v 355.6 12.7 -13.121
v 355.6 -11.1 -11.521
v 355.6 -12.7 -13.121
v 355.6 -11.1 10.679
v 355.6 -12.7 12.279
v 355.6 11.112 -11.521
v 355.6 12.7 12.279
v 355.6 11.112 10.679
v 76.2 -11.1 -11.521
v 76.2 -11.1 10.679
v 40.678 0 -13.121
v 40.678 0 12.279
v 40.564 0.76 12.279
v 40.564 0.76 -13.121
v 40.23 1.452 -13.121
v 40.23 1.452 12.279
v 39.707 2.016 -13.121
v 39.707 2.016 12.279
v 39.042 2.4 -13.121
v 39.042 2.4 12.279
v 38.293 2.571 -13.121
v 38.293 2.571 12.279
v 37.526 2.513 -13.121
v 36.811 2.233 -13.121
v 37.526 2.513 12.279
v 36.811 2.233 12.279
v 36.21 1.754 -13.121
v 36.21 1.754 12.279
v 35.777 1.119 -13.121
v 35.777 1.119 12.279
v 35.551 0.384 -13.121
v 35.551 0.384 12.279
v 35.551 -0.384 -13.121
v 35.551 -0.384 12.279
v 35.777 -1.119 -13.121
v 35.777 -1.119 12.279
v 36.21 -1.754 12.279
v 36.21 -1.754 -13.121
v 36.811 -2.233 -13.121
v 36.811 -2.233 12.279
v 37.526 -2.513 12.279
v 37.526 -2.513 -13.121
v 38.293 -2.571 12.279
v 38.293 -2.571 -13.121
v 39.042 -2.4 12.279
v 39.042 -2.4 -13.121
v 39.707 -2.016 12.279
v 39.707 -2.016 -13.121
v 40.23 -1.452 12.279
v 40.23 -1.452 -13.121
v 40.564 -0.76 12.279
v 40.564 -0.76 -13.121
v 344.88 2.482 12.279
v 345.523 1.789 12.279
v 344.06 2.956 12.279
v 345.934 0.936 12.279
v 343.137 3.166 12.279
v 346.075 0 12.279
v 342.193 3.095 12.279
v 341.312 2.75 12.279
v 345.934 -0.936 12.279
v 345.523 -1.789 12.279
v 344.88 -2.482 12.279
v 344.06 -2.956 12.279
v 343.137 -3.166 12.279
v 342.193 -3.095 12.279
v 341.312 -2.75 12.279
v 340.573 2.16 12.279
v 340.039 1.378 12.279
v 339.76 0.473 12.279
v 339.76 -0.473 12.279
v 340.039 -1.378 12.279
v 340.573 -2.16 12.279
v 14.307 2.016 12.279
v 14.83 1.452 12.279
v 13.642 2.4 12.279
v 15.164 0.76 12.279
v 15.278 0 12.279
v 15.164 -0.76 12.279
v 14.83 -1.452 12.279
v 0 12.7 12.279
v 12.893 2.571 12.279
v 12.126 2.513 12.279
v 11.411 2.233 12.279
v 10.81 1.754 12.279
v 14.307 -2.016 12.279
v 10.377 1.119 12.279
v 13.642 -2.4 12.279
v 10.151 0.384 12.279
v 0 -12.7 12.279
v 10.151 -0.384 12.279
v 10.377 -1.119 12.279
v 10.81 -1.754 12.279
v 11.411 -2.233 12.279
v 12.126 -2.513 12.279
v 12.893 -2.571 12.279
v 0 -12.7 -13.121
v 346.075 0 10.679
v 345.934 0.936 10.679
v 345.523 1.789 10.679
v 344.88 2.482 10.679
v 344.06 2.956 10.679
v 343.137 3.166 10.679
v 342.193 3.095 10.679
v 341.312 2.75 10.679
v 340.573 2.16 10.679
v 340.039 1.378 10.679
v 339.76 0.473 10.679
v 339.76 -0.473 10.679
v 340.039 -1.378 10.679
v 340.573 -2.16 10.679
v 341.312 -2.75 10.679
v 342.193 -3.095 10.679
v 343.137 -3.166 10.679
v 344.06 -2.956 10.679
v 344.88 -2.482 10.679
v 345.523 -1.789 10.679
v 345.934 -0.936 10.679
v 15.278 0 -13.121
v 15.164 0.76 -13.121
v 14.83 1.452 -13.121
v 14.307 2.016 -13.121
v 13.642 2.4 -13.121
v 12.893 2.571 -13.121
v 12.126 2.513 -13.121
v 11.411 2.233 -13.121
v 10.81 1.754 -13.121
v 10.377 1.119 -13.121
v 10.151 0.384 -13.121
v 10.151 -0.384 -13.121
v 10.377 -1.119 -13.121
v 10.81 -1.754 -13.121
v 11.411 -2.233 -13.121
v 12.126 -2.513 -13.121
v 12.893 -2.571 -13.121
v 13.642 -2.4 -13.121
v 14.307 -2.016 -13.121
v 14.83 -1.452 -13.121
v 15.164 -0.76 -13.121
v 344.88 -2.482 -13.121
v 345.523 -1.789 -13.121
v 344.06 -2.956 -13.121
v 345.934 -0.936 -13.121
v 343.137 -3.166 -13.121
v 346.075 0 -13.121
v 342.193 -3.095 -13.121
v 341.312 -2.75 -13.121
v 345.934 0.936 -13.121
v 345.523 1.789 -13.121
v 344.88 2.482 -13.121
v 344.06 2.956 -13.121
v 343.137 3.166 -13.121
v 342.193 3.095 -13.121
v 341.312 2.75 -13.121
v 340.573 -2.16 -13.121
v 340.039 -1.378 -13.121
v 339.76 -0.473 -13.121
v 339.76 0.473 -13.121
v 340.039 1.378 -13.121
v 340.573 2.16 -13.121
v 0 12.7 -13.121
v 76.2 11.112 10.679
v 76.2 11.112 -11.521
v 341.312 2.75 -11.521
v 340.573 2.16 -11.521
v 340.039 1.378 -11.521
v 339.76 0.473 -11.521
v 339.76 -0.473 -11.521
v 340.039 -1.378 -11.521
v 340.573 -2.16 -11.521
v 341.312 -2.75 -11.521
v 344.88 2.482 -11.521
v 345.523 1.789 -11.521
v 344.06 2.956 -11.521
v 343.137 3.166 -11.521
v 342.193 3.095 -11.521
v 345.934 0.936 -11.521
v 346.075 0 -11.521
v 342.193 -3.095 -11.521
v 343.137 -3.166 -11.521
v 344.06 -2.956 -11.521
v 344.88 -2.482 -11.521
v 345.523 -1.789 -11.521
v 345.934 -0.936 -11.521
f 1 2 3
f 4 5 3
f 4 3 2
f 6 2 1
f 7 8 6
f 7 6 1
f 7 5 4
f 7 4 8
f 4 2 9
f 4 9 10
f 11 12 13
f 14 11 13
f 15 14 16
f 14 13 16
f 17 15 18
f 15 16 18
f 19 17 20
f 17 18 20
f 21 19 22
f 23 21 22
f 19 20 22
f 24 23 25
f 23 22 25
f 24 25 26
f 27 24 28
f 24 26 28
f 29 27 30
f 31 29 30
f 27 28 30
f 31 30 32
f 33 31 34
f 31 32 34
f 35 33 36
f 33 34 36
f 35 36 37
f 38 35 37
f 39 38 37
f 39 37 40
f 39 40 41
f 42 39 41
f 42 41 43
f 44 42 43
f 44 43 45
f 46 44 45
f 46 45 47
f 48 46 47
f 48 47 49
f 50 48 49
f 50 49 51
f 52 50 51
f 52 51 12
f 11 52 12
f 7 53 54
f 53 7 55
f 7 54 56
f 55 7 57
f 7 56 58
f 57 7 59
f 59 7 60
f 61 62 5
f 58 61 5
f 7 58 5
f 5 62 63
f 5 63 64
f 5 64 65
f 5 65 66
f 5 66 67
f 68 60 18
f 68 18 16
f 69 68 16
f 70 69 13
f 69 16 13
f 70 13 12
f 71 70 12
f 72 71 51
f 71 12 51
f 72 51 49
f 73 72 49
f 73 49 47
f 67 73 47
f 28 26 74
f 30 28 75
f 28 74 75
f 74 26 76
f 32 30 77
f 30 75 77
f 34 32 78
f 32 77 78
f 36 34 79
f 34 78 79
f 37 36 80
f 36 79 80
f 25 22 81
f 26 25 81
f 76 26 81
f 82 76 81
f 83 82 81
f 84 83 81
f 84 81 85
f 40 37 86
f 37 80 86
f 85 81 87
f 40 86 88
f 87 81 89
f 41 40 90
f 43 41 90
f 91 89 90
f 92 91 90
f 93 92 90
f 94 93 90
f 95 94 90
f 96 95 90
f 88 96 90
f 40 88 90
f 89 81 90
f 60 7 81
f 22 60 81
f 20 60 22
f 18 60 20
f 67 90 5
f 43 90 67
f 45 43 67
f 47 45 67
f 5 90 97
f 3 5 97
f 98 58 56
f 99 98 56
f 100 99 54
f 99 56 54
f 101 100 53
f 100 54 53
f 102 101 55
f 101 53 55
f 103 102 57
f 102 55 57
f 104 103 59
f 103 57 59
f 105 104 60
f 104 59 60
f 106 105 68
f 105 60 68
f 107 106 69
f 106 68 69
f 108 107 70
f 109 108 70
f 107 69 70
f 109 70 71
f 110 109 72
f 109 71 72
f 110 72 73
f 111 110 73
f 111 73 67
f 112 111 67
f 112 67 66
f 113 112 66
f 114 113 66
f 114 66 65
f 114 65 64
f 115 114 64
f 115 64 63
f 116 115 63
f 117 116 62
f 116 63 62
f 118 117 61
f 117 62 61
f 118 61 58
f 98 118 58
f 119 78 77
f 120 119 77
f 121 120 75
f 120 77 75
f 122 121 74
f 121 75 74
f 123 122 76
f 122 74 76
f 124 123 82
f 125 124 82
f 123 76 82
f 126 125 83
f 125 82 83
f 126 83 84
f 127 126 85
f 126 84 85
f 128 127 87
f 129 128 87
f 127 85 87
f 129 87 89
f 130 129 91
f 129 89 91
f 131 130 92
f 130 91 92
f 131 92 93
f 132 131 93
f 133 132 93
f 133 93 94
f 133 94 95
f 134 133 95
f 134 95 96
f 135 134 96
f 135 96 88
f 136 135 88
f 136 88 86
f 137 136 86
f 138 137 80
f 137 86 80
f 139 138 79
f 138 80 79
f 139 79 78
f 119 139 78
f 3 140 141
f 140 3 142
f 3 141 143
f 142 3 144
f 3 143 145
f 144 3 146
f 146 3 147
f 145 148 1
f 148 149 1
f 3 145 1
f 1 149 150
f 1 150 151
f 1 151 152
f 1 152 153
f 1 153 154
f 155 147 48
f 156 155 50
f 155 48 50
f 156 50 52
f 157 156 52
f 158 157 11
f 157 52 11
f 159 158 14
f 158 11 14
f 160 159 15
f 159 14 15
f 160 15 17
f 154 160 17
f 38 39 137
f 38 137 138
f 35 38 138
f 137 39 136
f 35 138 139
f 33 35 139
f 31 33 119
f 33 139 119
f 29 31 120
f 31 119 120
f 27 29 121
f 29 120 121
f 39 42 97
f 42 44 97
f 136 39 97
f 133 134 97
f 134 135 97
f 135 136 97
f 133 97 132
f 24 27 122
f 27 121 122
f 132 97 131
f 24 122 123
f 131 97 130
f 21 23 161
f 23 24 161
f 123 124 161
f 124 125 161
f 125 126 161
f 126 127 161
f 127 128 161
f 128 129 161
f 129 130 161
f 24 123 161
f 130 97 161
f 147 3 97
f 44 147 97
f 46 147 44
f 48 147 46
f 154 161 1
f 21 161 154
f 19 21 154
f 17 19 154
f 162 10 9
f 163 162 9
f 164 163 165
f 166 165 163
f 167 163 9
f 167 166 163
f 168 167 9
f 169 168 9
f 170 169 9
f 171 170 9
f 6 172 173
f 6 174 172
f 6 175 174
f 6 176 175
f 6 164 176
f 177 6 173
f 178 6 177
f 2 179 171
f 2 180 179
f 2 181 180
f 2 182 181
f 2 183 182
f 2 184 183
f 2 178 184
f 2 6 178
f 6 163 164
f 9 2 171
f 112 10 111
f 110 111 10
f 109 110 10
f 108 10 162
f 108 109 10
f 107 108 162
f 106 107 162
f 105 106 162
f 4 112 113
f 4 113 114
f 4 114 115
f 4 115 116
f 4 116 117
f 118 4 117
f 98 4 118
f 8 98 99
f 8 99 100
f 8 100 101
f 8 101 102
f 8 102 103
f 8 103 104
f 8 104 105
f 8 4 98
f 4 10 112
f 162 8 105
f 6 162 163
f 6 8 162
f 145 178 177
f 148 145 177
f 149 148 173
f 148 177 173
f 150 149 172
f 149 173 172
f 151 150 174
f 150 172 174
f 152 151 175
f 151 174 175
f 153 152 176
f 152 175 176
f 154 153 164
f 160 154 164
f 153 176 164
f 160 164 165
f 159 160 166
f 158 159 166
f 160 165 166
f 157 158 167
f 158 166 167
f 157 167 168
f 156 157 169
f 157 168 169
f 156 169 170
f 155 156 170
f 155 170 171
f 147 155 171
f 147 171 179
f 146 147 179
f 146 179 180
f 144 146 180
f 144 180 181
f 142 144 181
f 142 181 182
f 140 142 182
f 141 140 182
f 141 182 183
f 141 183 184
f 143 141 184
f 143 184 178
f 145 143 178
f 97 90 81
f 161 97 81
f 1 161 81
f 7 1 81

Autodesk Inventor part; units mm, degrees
ref_plane "YZ Plane" through (0, 0, 0) normal (1, 0, 0) x (0, 1, 0)
ref_plane "XZ Plane" through (0, 0, 0) normal (0, 1, 0) x (-1, 0, 0)
ref_plane "XY Plane" through (0, 0, 0) normal (0, 0, 1) x (1, 0, 0)
sketch "Sketch1" plane through (0, 0, 0) normal (1, 0, 0) x (0, 1, 0)
  line L0 (12.7, 12.2788) -> (-12.7, 12.2788)
  line L1 (-12.7, 12.2788) -> (-12.7, -13.1212)
  line L2 (-12.7, -13.1212) -> (12.7, -13.1212)
  line L3 (12.7, -13.1212) -> (12.7, 12.2788)
  line L4 (0, 32.4321) -> (0, -31.5519)
  line L5 (24.3369, 0) -> (-19.9975, 0)
  point P0 (0, 0)
  dimension "d0" = 25.4
extrude "Extrusion1" add sketch "Sketch1" along normal blind 355.6
sketch "Sketch3" plane through (355.6, 0, 0) normal (1, 0, 0) x (0, 0, -1)
  line L0 (-10.6786, 11.1125) -> (11.521, 11.1125)
  line L1 (11.521, 11.1125) -> (11.521, -11.0998)
  line L2 (11.521, -11.0998) -> (-10.6786, -11.0998)
  line L3 (-10.6786, -11.0998) -> (-10.6786, 11.1125)
  line L4 (13.1212, 12.7) -> (-12.2788, 12.7) projected
  line L5 (-12.2788, 12.7) -> (-12.2788, -12.7) projected
  line L6 (13.1212, -12.7) -> (13.1212, 12.7) projected
  line L7 (-12.2788, -12.7) -> (13.1212, -12.7) projected
  point P0 (0, 0)
  dimension "d5" = 1.5875
  dimension "d6" = 1.6002
  dimension "d7" = 1.6002
  dimension "d8" = 1.6002
extrude "Extrusion2" cut sketch "Sketch3" against normal blind 279.4 contours L0 L1 L2 L3
sketch "Sketch4" plane through (0, -12.7, 12.2788) normal (0, 0, 1) x (1, 0, 0)
  circle A0 centre (342.9, 12.7) radius 3.175
  line L0 (355.6, 25.4) -> (355.6, 0) projected
  circle A1 centre (12.7, 12.7) radius 2.5781
  circle A2 centre (38.1, 12.7) radius 2.5781
  line L1 (0, 25.4) -> (355.6, 25.4) projected
  line L2 (0, 25.4) -> (0, 0) projected
  point P0 (0, 12.7)
  dimension "d11" = 6.35
  dimension "d12" = 12.7
  dimension "d15" = 5.1562
  dimension "d16" = 5.1562
  dimension "d17" = 25.4
  dimension "d18" = 12.7
  dimension "d19" = 12.7
  dimension "d20" = 12.7
extrude "Extrusion3" cut sketch "Sketch4" against normal blind 25.4
sketch "Sketch5" plane through (0, -12.7, 12.2788) normal (0, 0, 1) x (1, 0, 0)
  point P0 (0, 12.7)
equation "\"d19\" = d18"
properties part number "Part1-17-13.31255in" material "Aluminum 6061"
